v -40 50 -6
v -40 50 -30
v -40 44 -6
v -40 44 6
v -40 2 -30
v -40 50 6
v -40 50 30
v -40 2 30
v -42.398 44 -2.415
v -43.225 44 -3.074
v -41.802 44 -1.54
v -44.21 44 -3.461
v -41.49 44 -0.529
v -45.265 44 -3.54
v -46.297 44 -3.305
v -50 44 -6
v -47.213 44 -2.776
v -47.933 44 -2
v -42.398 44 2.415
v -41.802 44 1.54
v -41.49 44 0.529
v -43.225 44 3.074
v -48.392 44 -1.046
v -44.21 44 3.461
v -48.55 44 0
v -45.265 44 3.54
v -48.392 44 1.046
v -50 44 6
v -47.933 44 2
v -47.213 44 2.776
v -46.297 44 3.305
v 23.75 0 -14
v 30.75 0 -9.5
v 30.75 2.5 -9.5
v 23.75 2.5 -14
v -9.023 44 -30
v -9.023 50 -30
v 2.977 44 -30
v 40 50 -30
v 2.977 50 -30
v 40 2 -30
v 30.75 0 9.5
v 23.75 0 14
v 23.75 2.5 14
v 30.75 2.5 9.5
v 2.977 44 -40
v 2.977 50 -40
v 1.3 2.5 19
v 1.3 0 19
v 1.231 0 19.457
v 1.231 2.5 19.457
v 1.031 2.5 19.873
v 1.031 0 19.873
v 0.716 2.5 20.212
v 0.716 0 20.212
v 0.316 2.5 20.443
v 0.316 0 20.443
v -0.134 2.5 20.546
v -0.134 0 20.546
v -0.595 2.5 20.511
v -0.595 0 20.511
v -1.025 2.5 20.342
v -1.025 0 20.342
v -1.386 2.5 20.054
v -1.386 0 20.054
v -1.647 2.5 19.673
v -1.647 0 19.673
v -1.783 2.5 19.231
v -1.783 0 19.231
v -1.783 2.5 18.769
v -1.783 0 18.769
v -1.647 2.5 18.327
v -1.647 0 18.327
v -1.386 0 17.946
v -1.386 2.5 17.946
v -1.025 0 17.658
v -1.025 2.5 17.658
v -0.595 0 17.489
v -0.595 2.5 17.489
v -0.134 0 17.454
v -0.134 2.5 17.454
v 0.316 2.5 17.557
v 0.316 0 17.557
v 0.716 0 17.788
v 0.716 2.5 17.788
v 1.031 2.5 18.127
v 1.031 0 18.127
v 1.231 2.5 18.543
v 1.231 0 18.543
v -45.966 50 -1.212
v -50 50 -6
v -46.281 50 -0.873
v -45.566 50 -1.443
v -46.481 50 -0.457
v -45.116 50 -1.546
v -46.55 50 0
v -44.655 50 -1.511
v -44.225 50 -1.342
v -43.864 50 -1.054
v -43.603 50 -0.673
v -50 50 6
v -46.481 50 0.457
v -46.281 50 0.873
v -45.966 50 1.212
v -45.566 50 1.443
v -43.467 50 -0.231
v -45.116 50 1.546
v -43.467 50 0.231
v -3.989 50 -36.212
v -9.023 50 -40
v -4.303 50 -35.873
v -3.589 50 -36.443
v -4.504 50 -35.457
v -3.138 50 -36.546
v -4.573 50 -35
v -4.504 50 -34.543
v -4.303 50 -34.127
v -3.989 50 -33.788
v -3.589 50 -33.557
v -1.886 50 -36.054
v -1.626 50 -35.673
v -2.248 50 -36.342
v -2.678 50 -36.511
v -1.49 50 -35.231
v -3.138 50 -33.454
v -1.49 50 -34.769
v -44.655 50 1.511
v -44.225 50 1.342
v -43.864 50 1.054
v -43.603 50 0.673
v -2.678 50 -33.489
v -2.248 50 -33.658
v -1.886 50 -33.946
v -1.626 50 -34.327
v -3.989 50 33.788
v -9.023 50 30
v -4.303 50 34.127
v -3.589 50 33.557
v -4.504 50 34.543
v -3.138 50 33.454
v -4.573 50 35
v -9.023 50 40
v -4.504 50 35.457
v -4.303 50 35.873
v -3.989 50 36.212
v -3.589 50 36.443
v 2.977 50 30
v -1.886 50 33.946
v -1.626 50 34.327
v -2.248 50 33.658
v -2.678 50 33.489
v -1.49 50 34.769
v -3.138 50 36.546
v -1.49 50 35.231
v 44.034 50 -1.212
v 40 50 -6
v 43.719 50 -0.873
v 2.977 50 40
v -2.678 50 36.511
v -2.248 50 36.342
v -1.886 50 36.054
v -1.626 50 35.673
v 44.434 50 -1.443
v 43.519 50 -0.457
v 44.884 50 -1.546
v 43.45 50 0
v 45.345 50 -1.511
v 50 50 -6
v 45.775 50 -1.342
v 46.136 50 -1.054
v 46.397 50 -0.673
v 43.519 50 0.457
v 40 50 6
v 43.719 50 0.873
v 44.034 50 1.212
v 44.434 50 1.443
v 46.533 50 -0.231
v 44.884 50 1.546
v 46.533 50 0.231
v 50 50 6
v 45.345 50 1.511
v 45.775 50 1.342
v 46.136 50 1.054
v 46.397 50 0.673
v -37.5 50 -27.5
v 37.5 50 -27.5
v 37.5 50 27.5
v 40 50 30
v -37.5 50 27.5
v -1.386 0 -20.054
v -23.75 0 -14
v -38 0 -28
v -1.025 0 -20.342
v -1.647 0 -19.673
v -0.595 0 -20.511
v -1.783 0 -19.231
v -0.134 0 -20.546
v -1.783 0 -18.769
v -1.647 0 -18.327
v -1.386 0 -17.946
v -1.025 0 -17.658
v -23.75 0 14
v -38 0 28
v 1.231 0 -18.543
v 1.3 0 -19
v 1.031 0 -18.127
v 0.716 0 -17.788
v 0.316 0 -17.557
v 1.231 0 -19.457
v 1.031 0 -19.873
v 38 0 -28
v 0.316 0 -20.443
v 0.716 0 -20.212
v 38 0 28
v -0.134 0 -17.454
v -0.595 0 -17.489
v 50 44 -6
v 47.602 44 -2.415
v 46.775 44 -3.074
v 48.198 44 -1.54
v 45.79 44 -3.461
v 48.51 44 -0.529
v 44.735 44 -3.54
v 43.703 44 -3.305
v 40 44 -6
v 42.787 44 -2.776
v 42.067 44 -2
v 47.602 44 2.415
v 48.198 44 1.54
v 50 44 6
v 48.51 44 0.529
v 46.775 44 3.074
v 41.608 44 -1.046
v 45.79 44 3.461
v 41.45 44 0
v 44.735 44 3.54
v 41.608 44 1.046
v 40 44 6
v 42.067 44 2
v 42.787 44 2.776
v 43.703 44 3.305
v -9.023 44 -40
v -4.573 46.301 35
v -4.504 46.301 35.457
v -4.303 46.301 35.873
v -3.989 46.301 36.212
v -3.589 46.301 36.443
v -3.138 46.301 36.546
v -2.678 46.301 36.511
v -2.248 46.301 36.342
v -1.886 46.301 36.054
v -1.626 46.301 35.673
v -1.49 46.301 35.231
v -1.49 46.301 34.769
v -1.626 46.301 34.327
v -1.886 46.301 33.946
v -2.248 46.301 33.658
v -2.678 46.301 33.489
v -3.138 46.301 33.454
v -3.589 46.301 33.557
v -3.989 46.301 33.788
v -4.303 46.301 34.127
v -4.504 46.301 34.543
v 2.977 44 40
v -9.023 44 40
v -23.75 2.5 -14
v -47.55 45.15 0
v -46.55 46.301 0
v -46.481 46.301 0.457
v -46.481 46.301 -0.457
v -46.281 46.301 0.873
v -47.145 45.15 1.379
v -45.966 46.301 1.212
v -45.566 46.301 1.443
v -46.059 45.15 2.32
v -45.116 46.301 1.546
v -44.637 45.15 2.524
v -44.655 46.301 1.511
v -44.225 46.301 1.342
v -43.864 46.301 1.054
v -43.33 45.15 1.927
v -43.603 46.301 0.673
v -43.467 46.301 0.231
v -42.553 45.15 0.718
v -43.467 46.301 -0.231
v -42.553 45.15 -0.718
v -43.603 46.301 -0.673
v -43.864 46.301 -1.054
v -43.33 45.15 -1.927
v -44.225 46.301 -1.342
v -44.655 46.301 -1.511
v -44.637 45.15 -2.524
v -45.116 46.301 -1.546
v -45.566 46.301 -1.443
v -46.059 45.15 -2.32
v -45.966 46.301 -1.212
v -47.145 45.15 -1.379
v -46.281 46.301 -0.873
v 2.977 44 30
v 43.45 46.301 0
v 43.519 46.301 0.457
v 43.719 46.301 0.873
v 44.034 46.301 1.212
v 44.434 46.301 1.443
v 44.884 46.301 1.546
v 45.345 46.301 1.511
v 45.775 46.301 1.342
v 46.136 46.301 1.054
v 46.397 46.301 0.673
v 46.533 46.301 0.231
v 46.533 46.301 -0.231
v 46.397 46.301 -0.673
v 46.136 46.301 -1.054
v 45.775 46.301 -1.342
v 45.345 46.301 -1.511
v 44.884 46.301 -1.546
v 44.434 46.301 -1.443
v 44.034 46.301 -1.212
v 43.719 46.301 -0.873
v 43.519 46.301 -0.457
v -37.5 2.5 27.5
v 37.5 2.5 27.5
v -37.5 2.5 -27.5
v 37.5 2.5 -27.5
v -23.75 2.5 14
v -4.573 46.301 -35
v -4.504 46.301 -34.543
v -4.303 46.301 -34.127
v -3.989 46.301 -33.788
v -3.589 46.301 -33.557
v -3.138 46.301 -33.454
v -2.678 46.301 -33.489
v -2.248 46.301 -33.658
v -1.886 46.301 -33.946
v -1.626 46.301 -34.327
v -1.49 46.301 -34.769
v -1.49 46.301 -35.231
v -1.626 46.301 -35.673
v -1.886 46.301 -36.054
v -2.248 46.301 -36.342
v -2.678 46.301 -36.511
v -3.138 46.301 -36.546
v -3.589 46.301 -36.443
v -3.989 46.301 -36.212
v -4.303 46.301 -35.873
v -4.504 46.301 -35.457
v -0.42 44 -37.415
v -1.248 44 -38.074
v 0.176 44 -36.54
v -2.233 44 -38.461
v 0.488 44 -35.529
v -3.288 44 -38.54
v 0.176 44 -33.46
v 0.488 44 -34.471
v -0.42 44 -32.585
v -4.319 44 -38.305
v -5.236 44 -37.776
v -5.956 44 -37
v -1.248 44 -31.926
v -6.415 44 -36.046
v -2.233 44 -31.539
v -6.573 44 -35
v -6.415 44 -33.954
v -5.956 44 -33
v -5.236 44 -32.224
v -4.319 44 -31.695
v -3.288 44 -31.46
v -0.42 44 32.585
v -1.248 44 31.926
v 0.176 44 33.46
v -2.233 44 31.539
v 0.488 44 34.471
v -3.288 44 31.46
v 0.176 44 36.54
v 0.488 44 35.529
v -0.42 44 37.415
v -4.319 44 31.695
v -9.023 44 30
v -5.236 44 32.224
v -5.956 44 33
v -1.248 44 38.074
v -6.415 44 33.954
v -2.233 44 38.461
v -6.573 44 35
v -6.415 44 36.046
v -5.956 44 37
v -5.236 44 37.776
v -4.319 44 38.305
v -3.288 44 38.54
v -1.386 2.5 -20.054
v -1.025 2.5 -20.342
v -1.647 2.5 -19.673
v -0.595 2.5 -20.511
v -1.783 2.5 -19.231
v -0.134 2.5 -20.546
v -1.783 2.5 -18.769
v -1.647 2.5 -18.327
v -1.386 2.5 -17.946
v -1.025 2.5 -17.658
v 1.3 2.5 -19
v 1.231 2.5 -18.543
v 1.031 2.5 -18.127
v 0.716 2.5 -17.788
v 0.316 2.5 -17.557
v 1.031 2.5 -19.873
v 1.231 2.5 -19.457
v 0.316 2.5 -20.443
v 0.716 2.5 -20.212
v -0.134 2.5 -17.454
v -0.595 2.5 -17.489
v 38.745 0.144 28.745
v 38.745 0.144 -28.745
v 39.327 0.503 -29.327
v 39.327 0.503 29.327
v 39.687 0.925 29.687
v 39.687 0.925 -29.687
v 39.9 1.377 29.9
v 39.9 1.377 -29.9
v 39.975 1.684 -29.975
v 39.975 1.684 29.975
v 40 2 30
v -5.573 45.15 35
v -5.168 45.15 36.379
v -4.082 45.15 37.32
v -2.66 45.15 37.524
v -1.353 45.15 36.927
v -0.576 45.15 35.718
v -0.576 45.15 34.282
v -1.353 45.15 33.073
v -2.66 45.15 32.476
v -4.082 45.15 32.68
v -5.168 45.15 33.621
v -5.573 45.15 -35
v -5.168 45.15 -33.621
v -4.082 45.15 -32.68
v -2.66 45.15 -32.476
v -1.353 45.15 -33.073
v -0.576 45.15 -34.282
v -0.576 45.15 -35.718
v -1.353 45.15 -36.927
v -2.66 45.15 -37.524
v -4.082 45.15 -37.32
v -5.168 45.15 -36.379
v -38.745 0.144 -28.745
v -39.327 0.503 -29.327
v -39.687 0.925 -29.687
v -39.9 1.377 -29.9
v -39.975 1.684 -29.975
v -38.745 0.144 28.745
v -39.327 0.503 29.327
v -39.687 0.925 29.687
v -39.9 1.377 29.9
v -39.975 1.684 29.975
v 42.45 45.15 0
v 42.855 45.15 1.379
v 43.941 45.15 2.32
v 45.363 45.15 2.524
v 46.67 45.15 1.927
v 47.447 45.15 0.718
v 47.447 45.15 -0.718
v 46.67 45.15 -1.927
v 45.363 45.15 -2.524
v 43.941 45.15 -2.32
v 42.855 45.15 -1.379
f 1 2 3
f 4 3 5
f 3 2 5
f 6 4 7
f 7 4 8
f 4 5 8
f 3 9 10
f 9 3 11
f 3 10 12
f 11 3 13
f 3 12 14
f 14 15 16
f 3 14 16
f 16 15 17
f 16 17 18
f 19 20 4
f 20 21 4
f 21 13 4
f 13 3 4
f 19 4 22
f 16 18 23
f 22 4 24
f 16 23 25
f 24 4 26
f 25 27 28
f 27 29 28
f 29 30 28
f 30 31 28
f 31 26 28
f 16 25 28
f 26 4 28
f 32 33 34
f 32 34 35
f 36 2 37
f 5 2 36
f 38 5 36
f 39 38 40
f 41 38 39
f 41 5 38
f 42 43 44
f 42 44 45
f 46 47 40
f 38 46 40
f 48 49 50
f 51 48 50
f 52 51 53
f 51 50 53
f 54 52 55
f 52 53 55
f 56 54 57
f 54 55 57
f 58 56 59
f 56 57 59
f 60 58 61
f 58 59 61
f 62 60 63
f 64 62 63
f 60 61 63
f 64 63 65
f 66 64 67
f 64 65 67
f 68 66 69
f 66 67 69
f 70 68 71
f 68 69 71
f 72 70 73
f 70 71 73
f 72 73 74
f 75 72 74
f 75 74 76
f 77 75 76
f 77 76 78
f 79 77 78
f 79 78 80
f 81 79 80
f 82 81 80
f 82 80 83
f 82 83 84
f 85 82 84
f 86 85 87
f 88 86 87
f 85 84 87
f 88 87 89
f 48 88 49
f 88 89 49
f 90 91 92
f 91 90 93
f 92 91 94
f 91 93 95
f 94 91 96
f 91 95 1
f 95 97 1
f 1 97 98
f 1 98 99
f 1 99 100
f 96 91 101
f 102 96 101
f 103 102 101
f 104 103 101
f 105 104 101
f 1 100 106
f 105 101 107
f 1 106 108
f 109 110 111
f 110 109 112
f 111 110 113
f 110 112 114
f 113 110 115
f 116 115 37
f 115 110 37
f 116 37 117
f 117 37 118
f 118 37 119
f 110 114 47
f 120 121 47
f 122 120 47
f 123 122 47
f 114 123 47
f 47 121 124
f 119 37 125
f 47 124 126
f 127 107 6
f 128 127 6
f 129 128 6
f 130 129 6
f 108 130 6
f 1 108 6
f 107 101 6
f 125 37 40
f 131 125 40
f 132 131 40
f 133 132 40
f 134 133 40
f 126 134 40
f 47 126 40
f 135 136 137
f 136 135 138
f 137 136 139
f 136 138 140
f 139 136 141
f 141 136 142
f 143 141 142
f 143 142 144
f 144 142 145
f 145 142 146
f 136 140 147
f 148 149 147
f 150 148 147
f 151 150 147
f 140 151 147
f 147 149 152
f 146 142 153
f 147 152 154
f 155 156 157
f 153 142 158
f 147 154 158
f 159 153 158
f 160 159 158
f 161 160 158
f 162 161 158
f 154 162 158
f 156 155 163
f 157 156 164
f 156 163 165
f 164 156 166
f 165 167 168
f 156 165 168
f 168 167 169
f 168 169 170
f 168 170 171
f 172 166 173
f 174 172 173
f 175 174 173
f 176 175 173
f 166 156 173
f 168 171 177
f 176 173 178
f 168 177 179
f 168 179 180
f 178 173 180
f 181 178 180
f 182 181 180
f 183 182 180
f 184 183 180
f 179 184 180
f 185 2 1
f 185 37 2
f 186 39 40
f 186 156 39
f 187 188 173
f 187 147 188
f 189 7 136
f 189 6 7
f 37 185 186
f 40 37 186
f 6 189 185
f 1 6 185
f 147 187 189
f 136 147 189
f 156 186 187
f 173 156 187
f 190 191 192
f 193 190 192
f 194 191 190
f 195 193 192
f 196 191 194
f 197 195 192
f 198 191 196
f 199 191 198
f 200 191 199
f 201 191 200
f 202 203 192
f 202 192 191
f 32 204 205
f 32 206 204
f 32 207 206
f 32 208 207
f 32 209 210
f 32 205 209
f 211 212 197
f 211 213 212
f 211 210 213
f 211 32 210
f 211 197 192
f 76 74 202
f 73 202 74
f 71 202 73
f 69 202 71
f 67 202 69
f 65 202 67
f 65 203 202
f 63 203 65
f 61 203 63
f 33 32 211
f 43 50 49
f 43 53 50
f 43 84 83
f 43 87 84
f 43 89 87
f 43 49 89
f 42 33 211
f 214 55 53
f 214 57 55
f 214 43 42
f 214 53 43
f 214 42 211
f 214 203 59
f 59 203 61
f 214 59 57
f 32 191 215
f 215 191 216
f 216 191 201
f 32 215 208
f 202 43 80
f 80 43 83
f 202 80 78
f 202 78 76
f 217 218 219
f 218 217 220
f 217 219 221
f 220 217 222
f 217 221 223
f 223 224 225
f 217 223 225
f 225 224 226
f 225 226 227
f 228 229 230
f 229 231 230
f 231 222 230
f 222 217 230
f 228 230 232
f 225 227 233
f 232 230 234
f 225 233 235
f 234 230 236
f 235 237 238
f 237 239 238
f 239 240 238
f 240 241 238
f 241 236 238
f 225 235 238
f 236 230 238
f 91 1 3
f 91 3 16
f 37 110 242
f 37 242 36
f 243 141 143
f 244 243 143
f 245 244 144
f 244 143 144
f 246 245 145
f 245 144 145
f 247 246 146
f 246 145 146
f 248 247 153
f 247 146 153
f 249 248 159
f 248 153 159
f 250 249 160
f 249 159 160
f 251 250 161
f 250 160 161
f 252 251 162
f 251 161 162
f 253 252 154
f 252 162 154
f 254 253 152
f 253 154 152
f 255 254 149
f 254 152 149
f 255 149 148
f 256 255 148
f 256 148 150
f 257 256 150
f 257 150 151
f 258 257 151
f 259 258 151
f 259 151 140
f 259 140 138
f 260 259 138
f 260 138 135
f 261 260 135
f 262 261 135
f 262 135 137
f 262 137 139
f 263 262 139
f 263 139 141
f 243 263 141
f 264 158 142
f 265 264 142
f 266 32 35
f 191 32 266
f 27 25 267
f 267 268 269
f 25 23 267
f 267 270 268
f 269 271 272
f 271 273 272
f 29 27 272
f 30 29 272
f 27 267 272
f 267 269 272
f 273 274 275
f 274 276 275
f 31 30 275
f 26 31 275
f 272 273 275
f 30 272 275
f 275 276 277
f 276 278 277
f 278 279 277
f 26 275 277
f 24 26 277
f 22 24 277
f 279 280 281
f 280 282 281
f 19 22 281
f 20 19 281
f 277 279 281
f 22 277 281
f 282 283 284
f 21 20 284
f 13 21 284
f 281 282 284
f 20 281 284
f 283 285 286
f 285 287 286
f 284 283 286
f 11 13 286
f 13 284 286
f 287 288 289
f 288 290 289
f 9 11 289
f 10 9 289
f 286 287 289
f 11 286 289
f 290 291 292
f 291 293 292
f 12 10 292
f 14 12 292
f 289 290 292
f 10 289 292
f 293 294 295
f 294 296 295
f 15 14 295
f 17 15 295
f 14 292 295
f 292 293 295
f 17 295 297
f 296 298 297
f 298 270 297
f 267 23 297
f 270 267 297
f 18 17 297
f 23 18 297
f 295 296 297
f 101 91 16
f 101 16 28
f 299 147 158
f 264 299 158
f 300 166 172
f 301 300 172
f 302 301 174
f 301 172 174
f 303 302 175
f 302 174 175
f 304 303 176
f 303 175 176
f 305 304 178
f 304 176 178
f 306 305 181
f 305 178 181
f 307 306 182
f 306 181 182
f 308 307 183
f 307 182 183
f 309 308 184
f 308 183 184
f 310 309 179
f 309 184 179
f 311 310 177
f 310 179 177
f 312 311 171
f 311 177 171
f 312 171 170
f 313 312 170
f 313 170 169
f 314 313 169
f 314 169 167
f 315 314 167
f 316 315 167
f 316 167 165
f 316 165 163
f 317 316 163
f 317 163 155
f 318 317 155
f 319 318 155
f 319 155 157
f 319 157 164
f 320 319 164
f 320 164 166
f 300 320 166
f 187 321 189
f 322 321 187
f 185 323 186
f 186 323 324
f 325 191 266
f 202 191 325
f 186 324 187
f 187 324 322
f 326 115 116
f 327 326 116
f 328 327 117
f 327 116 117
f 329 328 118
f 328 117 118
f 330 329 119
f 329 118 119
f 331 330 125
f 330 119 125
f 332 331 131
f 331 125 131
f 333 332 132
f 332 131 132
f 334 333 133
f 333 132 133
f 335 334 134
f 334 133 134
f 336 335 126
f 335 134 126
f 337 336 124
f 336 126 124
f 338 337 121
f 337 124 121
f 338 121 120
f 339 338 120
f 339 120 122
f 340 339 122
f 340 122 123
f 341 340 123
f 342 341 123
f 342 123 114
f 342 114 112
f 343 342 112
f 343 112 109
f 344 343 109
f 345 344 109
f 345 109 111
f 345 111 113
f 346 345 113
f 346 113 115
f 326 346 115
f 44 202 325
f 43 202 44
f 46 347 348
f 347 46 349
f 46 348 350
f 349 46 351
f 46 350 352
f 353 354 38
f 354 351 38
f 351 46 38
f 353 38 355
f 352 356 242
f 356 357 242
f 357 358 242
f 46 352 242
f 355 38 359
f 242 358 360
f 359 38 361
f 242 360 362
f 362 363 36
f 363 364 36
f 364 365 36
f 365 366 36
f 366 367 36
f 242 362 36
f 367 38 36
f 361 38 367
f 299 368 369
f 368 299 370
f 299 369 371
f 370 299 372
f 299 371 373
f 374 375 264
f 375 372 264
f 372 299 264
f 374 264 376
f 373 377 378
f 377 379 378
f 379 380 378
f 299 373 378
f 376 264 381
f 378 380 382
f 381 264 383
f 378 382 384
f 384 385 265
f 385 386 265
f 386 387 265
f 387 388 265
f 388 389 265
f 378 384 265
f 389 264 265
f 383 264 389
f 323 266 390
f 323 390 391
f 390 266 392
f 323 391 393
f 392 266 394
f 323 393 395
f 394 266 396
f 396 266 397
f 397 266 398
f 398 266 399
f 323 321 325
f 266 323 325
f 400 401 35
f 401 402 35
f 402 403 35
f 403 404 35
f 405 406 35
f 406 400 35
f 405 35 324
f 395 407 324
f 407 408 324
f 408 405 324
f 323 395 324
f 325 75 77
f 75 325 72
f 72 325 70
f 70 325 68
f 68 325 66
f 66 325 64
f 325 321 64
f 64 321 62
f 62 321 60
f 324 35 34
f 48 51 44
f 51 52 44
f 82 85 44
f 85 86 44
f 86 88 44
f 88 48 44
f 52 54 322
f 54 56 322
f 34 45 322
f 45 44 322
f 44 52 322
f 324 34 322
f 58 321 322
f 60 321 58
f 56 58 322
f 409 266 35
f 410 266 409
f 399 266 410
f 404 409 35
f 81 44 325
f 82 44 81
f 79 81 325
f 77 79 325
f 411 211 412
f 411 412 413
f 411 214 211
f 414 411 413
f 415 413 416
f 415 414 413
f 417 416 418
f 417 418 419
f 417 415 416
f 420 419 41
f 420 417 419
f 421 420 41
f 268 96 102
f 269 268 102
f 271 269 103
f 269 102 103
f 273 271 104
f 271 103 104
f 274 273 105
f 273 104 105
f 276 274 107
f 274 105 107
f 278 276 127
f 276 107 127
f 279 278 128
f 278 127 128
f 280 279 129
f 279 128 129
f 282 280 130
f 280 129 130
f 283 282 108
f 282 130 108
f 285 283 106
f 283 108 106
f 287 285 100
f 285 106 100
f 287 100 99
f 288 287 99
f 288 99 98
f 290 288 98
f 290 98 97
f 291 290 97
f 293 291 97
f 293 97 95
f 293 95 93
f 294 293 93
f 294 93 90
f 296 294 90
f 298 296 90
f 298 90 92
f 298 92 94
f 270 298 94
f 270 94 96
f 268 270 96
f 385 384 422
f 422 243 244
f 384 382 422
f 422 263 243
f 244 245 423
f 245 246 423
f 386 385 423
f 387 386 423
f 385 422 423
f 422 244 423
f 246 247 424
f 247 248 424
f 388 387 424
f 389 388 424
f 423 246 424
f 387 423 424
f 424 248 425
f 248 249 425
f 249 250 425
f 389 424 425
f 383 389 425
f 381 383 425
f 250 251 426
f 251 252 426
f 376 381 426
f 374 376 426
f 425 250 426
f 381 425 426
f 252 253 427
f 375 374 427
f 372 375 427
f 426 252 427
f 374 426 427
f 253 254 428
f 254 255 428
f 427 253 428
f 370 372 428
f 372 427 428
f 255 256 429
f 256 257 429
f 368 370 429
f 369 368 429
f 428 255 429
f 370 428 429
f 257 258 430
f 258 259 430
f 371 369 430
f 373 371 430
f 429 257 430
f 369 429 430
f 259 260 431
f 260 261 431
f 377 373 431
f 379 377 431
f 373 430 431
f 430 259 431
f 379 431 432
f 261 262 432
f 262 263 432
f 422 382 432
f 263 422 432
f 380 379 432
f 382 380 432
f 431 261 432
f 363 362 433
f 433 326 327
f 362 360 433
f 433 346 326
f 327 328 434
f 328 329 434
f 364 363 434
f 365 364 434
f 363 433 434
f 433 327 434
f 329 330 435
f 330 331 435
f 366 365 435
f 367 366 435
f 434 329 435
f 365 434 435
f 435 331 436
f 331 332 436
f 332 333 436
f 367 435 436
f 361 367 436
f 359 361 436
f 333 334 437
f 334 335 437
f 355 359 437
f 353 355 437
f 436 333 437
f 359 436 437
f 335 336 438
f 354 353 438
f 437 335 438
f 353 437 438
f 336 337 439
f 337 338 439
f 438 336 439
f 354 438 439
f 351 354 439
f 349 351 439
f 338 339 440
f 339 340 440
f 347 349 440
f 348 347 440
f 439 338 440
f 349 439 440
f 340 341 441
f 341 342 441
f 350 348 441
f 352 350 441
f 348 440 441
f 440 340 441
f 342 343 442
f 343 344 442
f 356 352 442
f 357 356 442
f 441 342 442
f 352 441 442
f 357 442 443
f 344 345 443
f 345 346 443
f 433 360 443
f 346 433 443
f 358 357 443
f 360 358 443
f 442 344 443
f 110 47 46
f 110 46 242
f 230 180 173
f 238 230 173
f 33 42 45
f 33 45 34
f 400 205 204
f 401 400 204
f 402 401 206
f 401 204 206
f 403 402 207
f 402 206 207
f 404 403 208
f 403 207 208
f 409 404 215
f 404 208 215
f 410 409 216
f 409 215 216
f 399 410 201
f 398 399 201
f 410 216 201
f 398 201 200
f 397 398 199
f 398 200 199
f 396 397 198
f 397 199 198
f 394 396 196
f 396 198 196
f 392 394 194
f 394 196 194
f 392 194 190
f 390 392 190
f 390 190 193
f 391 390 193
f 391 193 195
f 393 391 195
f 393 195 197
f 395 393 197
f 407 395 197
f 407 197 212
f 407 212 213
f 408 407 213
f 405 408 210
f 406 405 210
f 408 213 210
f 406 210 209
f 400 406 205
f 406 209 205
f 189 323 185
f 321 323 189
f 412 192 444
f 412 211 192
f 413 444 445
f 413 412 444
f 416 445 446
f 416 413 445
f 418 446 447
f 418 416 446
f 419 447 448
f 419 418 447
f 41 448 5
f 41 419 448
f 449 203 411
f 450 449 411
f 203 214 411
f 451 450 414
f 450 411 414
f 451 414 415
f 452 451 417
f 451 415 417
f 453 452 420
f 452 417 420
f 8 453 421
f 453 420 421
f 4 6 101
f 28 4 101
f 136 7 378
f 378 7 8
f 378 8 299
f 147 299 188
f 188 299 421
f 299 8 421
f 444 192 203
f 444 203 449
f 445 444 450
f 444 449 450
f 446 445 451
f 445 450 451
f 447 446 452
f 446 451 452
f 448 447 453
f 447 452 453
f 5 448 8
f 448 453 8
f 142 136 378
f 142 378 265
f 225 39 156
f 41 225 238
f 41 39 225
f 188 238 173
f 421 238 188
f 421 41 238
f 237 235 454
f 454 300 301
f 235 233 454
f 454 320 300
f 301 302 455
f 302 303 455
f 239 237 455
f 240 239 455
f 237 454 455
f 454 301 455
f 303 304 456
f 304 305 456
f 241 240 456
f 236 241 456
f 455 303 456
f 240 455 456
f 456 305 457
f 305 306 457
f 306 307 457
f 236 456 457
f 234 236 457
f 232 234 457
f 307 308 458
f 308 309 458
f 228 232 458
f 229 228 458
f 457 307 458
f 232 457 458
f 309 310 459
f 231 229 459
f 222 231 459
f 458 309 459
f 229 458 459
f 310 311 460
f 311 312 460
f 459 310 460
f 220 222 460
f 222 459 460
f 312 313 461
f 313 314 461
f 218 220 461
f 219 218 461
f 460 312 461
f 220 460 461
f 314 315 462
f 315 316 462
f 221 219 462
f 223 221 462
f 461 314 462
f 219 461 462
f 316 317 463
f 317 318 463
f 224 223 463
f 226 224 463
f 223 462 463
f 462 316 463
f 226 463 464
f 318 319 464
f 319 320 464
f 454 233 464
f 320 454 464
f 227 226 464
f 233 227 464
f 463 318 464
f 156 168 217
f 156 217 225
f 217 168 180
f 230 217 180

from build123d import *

# Parameters (mm, degrees)
F0_W            = 80
F0_H            = 60
F0_W_2          = 75
F0_H_2          = 55
F1_DEPTH        = 50
F0_R            = 1.55
F2_DEPTH        = 2.5
F3_W            = 10
F3_H            = 12
F3_R            = 1.55
F3_W_2          = 12
F3_H_2          = 10
F4_DEPTH        = 6
F5_R            = 2
F10_D           = 3.1
F10_CSINK_D     = 7.1
F10_CSINK_ANGLE = 82


with BuildPart() as f1:
    # F0 (on Front) → F1 (new body)
    with BuildSketch(Plane.XZ):
        Rectangle(F0_W, F0_H)
        Rectangle(F0_W_2, F0_H_2, mode=Mode.SUBTRACT)
    extrude(amount=-F1_DEPTH)

    # F0 (on Front) → F2 (join)
    with BuildSketch(Plane.XZ):
        Rectangle(F0_W_2, F0_H_2)
        with Locations((-0.25, -19)):
            Circle(F0_R, mode=Mode.SUBTRACT)
        with Locations((-0.25, 19)):
            Circle(F0_R, mode=Mode.SUBTRACT)
        Polygon((30.75, -9.5), (23.75, -14), (-23.75, -14), (-23.75, 14), (23.75, 14), (30.75, 9.5), align=None, mode=Mode.SUBTRACT)
    extrude(amount=-F2_DEPTH)

    # F3 (on face) → F4 (join)
    with BuildSketch(Plane(origin=(0, 50, 0), x_dir=(-1, 0, 0), z_dir=(0, 1, 0))):
        with Locations((45, 0)):
            Rectangle(F3_W, F3_H)
        with Locations((45, 0)):
            Circle(F3_R, mode=Mode.SUBTRACT)
        with Locations((3.022505, -35)):
            Rectangle(F3_W_2, F3_H_2)
        with Locations((3.022505, -35)):
            Circle(F3_R, mode=Mode.SUBTRACT)
        with Locations((-45, 0)):
            Rectangle(F3_W, F3_H)
        with Locations((-45, 0)):
            Circle(F3_R, mode=Mode.SUBTRACT)
        with Locations((3.022505, 35)):
            Rectangle(F3_W_2, F3_H_2)
        with Locations((3.022505, 35)):
            Circle(F3_R, mode=Mode.SUBTRACT)
    extrude(amount=-F4_DEPTH)

    # F5
    f5_edges = [f1.edges().sort_by_distance(p)[0] for p in [
        (40, 0, 0),
        (-40, 0, 0),
        (0, 0, 30),
        (0, 0, -30),
    ]]
    fillet(f5_edges, radius=F5_R)

    # F10 (through all)
    with Locations(Plane.XZ.offset(-44)):
        with Locations((-3.022505, -35), (-3.022505, 35), (-45, 0), (45, 0)):
            CounterSinkHole(F10_D / 2, F10_CSINK_D / 2, counter_sink_angle=F10_CSINK_ANGLE)


solid = f1.part
